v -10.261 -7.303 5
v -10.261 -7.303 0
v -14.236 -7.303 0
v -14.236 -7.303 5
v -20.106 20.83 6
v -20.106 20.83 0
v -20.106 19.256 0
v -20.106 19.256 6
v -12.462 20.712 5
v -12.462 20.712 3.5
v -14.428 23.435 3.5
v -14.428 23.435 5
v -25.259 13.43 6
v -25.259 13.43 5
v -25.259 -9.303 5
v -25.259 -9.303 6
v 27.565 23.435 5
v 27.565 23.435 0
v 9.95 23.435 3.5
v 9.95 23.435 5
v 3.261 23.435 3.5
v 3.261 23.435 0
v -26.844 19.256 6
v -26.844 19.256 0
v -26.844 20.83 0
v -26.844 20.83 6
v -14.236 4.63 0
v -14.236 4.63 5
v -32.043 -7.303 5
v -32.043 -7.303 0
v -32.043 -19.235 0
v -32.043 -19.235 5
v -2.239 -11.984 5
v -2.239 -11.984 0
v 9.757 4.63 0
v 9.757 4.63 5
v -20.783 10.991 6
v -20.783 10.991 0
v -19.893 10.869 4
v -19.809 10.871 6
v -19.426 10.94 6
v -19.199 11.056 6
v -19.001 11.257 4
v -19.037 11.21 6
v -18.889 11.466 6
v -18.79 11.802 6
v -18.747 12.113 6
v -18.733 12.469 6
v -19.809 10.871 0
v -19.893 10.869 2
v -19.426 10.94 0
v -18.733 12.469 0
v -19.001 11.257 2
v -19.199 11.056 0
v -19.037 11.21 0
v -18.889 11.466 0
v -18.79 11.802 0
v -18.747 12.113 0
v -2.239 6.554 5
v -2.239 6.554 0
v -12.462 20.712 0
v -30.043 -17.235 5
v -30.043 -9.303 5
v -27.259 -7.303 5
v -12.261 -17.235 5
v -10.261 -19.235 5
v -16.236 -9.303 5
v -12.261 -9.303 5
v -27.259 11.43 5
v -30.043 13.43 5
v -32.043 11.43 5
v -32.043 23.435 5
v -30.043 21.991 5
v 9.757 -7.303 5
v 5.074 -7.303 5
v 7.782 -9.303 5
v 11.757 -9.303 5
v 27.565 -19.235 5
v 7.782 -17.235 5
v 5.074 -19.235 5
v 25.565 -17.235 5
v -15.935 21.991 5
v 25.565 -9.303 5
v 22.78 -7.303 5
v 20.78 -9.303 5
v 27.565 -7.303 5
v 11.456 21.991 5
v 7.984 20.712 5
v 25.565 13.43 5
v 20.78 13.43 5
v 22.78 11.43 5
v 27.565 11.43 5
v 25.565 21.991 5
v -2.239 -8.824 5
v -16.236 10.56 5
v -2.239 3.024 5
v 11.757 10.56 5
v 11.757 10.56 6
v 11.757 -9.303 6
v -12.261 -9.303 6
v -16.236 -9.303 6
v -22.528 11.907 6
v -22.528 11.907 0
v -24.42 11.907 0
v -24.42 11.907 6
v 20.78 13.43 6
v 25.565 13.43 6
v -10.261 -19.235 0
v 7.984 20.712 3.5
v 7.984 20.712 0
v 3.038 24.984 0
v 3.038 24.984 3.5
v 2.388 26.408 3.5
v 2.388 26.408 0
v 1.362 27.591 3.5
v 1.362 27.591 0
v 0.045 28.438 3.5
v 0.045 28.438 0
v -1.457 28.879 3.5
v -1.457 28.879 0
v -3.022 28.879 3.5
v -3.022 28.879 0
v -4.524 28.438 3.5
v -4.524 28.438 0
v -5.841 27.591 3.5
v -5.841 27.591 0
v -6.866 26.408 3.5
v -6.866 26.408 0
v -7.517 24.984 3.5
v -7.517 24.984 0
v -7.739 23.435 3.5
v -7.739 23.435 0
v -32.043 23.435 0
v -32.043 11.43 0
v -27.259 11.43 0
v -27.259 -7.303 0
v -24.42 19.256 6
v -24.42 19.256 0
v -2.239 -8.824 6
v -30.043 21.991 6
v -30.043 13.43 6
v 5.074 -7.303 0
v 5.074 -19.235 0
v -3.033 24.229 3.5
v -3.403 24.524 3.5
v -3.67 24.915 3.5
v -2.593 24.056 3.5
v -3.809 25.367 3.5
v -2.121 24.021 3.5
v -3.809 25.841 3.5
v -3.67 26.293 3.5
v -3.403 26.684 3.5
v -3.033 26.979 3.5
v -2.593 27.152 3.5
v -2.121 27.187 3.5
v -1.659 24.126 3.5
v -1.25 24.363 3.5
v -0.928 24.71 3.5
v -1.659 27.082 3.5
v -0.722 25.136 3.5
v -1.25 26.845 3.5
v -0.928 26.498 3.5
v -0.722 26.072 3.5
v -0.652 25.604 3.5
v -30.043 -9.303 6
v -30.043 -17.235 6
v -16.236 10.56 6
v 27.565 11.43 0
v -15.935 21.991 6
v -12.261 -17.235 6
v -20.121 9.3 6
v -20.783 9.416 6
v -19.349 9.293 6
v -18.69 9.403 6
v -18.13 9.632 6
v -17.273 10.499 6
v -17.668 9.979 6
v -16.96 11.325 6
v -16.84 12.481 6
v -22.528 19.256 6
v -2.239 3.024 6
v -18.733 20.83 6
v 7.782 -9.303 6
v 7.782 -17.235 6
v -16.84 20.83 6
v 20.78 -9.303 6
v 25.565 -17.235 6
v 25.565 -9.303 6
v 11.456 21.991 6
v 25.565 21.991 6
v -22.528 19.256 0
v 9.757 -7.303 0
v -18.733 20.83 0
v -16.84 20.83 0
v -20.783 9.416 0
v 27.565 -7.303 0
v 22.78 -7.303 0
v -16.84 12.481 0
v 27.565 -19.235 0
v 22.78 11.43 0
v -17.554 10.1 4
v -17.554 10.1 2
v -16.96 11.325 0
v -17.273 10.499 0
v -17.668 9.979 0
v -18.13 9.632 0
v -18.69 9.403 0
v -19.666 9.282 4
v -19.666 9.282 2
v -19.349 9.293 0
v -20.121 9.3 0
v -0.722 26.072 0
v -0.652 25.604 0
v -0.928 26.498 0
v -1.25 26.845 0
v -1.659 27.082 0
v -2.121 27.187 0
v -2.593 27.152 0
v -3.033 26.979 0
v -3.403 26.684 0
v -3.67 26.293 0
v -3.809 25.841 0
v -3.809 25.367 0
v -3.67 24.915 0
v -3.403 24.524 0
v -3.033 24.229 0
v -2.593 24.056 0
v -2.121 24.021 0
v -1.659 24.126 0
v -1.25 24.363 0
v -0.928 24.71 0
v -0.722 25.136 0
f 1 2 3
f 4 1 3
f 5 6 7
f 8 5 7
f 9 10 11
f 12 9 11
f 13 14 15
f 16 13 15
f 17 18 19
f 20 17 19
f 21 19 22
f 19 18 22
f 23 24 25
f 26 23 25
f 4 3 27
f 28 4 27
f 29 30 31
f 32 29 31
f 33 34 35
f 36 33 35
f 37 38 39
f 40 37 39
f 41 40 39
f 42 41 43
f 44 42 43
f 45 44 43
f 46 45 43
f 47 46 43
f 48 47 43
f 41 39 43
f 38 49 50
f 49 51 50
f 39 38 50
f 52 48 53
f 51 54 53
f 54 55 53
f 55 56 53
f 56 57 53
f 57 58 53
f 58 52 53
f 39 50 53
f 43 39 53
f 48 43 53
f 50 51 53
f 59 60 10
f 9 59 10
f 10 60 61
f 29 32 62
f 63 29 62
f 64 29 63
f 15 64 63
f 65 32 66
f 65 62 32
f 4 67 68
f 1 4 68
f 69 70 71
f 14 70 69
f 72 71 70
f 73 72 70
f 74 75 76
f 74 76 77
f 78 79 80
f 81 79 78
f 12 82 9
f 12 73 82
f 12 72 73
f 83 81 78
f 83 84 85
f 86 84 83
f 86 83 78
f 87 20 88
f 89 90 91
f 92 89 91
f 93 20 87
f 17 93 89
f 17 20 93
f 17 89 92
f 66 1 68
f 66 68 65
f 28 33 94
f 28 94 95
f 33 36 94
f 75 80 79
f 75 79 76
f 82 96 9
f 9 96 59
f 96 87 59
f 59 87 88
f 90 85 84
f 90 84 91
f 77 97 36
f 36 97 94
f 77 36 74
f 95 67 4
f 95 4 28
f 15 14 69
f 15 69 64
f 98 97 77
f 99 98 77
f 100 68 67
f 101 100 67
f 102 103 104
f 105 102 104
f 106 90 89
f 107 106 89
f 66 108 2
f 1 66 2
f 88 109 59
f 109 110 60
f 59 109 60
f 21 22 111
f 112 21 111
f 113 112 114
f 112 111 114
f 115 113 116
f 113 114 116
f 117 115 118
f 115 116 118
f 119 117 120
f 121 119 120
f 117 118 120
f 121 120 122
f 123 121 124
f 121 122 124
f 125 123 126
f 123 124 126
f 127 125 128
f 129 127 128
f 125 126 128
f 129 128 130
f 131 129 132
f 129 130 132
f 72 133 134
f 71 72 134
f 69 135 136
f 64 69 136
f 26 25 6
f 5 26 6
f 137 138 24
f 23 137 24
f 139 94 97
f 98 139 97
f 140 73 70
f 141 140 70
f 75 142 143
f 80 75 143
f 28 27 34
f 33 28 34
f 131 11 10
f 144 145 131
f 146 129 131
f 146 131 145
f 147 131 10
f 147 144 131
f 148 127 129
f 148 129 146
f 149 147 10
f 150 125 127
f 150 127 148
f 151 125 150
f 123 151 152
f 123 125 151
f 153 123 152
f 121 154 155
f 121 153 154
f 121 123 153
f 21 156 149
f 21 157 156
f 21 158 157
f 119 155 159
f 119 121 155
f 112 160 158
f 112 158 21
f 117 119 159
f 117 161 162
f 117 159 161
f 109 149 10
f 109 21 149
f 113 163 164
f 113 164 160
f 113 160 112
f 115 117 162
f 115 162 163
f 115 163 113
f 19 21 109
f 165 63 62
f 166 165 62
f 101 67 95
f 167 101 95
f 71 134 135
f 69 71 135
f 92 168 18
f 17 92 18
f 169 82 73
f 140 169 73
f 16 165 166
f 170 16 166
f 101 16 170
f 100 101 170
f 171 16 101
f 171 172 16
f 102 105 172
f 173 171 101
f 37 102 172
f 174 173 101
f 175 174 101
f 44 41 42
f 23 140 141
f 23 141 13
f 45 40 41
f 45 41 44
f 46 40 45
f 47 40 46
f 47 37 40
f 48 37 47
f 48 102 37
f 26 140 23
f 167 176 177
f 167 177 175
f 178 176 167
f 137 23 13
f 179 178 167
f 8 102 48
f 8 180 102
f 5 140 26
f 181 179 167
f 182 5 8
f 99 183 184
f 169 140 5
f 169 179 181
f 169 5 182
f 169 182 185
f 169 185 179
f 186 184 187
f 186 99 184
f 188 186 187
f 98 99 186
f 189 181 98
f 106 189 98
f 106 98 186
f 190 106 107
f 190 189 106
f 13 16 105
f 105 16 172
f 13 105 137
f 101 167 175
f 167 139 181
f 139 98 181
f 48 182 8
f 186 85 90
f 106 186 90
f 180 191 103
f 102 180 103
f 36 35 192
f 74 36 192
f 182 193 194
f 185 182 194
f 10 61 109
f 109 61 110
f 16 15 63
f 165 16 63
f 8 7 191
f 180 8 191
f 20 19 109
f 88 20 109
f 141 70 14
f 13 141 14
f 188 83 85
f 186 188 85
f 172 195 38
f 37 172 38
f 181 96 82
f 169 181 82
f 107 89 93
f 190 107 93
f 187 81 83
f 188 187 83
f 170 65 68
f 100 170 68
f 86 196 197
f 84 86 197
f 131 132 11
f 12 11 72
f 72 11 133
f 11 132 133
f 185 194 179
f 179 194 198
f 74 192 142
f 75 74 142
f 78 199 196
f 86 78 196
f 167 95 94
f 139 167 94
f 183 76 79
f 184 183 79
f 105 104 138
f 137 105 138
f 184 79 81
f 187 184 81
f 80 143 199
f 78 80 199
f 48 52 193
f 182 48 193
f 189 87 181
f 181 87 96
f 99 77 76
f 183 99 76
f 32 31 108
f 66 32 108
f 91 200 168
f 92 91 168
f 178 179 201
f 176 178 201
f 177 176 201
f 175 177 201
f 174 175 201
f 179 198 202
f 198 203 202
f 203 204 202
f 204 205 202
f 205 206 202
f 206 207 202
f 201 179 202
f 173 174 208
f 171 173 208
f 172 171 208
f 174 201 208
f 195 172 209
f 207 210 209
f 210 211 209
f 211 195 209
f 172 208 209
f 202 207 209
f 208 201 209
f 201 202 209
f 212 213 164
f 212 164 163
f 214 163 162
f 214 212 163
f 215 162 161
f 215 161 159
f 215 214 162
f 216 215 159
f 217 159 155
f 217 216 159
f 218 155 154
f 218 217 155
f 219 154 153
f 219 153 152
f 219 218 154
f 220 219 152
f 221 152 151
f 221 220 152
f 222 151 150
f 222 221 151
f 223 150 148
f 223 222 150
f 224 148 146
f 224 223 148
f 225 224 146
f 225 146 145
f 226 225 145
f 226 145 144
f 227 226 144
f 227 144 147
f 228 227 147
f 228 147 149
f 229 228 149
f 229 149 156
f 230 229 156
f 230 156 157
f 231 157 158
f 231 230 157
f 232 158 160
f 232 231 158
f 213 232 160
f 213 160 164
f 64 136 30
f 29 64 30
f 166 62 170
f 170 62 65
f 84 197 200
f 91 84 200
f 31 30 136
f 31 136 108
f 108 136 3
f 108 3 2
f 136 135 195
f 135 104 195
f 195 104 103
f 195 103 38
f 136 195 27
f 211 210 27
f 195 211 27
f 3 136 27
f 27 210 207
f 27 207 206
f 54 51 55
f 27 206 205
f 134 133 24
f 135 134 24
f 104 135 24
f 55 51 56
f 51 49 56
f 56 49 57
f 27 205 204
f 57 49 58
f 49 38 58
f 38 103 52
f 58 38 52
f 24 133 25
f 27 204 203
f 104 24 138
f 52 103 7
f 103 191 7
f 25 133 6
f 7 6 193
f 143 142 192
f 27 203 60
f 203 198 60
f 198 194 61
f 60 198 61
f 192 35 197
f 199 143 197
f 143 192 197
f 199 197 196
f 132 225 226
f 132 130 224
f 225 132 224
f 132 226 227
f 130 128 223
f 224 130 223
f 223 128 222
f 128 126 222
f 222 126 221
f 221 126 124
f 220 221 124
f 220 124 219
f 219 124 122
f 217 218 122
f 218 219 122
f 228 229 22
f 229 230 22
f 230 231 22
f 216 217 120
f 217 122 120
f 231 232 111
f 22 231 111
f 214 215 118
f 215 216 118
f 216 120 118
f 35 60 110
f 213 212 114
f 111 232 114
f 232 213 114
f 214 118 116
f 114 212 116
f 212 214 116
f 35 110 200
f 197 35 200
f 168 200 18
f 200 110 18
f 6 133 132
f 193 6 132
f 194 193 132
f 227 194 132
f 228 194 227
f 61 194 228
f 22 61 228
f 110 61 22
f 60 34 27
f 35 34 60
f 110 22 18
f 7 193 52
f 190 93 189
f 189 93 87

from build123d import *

# Parameters (mm, degrees)
F1_DEPTH = 6
F2_DEPTH = 5
F0_R     = 1.5875
F3_DEPTH = 3.5


with BuildPart() as f1:
    # F0 (on Top) → F1 (new body)
    with BuildSketch(Plane.XY):
        Polygon((-15.9351881593, 21.9910480082), (-30.0434779789, 21.9910480082), (-30.0434779789, 13.430057697), (-25.258971706, 13.430057697), (-25.258971706, -9.3025706224), (-30.0434779789, -9.3025706224), (-30.0434779789, -17.2349981517), (-12.261220109, -17.2349981517), (-12.261220109, -9.3025706224), (-16.2359463498, -9.3025706224), (-16.2359463498, 10.55959519), (-2.239366062, -8.8239717362), (11.7572142258, 10.55959519), (11.7572142258, -9.3025706224), (7.782487985, -9.3025706224), (7.782487985, -17.2349981517), (25.5647458549, -17.2349981517), (25.5647458549, -9.3025706224), (20.7802395821, -9.3025706224), (20.7802395821, 13.430057697), (25.5647458549, 13.430057697), (25.5647458549, 21.9910480082), (11.4564560354, 21.9910480082), (-2.239366062, 3.0239947156), align=None)
        Polygon((-22.5275315528, 19.25616391), (-22.5275315528, 11.906554535), (-24.4201096778, 11.906554535), (-24.4201096778, 19.25616391), (-26.8439378028, 19.25616391), (-26.8439378028, 20.83038266), (-20.1056565528, 20.83038266), (-20.1056565528, 19.25616391), align=None, mode=Mode.SUBTRACT)
        with BuildLine():
            add(Edge.make_bspline(
                [(-17.5538987403, 10.09991391), (-18.2677659278, 9.281554535), (-19.6662034278, 9.281554535)],
                knots=[0, 0, 0, 1, 1, 1], degree=2))
            add(Edge.make_bspline(
                [(-19.6662034278, 9.281554535), (-20.3068284278, 9.281554535), (-20.7833909278, 9.41632016)],
                knots=[0, 0, 0, 1, 1, 1], degree=2))
            Line((-20.7833909278, 9.41632016), (-20.7833909278, 10.99053891))
            add(Edge.make_bspline(
                [(-20.7833909278, 10.99053891), (-20.2951096778, 10.86944516), (-19.8927659278, 10.86944516)],
                knots=[0, 0, 0, 1, 1, 1], degree=2))
            add(Edge.make_bspline(
                [(-19.8927659278, 10.86944516), (-19.2697190528, 10.86944516), (-19.0011643653, 11.2571404725)],
                knots=[0, 0, 0, 1, 1, 1], degree=2))
            add(Edge.make_bspline(
                [(-19.0011643653, 11.2571404725), (-18.7326096778, 11.644835785), (-18.7326096778, 12.469054535)],
                knots=[0, 0, 0, 1, 1, 1], degree=2))
            Line((-18.7326096778, 12.469054535), (-18.7326096778, 20.83038266))
            Line((-18.7326096778, 20.83038266), (-16.8400315528, 20.83038266))
            Line((-16.8400315528, 20.83038266), (-16.8400315528, 12.480773285))
            add(Edge.make_bspline(
                [(-16.8400315528, 12.480773285), (-16.8400315528, 10.918273285), (-17.5538987403, 10.09991391)],
                knots=[0, 0, 0, 1, 1, 1], degree=2))
        make_face(mode=Mode.SUBTRACT)
    extrude(amount=F1_DEPTH)

    # F0 (on Top) → F2 (join)
    with BuildSketch(Plane.XY):
        Polygon((-32.0434779789, 23.4347821093), (-32.0434779789, 11.430057697), (-27.258971706, 11.430057697), (-27.258971706, -7.3025706224), (-32.0434779789, -7.3025706224), (-32.0434779789, -19.2349981517), (-10.261220109, -19.2349981517), (-10.261220109, -7.3025706224), (-14.2359463498, -7.3025706224), (-14.2359463498, 4.6298569068), (-2.239366062, -11.9839524746), (9.7572142258, 4.6298569068), (9.7572142258, -7.3025706224), (5.0740577281, -7.3025706224), (5.0740577281, -19.2349981517), (27.5647458549, -19.2349981517), (27.5647458549, -7.3025706224), (22.7802395821, -7.3025706224), (22.7802395821, 11.430057697), (27.5647458549, 11.430057697), (27.5647458549, 23.4347821093), (9.9496720359, 23.4347821093), (7.983629638, 20.712051727), (-2.239366062, 6.5544419922), (-12.462361762, 20.712051727), (-14.4284041598, 23.4347821093), align=None)
        Polygon((-30.0434779789, 13.430057697), (-30.0434779789, 21.9910480082), (-15.9351881593, 21.9910480082), (-2.239366062, 3.0239947156), (11.4564560354, 21.9910480082), (25.5647458549, 21.9910480082), (25.5647458549, 13.430057697), (20.7802395821, 13.430057697), (20.7802395821, -9.3025706224), (25.5647458549, -9.3025706224), (25.5647458549, -17.2349981517), (7.782487985, -17.2349981517), (7.782487985, -9.3025706224), (11.7572142258, -9.3025706224), (11.7572142258, 10.55959519), (-2.239366062, -8.8239717362), (-16.2359463498, 10.55959519), (-16.2359463498, -9.3025706224), (-12.261220109, -9.3025706224), (-12.261220109, -17.2349981517), (-30.0434779789, -17.2349981517), (-30.0434779789, -9.3025706224), (-25.258971706, -9.3025706224), (-25.258971706, 13.430057697), align=None, mode=Mode.SUBTRACT)
    extrude(amount=F2_DEPTH)

    # F0 (on Top) → F3 (join)
    with BuildSketch(Plane.XY):
        Polygon((-7.739366062, 23.4347821093), (-14.4284041598, 23.4347821093), (-12.462361762, 20.712051727), (7.983629638, 20.712051727), (9.9496720359, 23.4347821093), (3.260633938, 23.4347821093), align=None)
        with BuildLine():
            ThreePointArc((3.260633938, 23.4347821093), (-2.239366062, 28.9347821093), (-7.739366062, 23.4347821093))
            Line((-7.739366062, 23.4347821093), (3.260633938, 23.4347821093))
        make_face()
        with Locations((-2.239366062, 25.6040561944)):
            Circle(F0_R, mode=Mode.SUBTRACT)
    extrude(amount=F3_DEPTH)


solid = f1.part
